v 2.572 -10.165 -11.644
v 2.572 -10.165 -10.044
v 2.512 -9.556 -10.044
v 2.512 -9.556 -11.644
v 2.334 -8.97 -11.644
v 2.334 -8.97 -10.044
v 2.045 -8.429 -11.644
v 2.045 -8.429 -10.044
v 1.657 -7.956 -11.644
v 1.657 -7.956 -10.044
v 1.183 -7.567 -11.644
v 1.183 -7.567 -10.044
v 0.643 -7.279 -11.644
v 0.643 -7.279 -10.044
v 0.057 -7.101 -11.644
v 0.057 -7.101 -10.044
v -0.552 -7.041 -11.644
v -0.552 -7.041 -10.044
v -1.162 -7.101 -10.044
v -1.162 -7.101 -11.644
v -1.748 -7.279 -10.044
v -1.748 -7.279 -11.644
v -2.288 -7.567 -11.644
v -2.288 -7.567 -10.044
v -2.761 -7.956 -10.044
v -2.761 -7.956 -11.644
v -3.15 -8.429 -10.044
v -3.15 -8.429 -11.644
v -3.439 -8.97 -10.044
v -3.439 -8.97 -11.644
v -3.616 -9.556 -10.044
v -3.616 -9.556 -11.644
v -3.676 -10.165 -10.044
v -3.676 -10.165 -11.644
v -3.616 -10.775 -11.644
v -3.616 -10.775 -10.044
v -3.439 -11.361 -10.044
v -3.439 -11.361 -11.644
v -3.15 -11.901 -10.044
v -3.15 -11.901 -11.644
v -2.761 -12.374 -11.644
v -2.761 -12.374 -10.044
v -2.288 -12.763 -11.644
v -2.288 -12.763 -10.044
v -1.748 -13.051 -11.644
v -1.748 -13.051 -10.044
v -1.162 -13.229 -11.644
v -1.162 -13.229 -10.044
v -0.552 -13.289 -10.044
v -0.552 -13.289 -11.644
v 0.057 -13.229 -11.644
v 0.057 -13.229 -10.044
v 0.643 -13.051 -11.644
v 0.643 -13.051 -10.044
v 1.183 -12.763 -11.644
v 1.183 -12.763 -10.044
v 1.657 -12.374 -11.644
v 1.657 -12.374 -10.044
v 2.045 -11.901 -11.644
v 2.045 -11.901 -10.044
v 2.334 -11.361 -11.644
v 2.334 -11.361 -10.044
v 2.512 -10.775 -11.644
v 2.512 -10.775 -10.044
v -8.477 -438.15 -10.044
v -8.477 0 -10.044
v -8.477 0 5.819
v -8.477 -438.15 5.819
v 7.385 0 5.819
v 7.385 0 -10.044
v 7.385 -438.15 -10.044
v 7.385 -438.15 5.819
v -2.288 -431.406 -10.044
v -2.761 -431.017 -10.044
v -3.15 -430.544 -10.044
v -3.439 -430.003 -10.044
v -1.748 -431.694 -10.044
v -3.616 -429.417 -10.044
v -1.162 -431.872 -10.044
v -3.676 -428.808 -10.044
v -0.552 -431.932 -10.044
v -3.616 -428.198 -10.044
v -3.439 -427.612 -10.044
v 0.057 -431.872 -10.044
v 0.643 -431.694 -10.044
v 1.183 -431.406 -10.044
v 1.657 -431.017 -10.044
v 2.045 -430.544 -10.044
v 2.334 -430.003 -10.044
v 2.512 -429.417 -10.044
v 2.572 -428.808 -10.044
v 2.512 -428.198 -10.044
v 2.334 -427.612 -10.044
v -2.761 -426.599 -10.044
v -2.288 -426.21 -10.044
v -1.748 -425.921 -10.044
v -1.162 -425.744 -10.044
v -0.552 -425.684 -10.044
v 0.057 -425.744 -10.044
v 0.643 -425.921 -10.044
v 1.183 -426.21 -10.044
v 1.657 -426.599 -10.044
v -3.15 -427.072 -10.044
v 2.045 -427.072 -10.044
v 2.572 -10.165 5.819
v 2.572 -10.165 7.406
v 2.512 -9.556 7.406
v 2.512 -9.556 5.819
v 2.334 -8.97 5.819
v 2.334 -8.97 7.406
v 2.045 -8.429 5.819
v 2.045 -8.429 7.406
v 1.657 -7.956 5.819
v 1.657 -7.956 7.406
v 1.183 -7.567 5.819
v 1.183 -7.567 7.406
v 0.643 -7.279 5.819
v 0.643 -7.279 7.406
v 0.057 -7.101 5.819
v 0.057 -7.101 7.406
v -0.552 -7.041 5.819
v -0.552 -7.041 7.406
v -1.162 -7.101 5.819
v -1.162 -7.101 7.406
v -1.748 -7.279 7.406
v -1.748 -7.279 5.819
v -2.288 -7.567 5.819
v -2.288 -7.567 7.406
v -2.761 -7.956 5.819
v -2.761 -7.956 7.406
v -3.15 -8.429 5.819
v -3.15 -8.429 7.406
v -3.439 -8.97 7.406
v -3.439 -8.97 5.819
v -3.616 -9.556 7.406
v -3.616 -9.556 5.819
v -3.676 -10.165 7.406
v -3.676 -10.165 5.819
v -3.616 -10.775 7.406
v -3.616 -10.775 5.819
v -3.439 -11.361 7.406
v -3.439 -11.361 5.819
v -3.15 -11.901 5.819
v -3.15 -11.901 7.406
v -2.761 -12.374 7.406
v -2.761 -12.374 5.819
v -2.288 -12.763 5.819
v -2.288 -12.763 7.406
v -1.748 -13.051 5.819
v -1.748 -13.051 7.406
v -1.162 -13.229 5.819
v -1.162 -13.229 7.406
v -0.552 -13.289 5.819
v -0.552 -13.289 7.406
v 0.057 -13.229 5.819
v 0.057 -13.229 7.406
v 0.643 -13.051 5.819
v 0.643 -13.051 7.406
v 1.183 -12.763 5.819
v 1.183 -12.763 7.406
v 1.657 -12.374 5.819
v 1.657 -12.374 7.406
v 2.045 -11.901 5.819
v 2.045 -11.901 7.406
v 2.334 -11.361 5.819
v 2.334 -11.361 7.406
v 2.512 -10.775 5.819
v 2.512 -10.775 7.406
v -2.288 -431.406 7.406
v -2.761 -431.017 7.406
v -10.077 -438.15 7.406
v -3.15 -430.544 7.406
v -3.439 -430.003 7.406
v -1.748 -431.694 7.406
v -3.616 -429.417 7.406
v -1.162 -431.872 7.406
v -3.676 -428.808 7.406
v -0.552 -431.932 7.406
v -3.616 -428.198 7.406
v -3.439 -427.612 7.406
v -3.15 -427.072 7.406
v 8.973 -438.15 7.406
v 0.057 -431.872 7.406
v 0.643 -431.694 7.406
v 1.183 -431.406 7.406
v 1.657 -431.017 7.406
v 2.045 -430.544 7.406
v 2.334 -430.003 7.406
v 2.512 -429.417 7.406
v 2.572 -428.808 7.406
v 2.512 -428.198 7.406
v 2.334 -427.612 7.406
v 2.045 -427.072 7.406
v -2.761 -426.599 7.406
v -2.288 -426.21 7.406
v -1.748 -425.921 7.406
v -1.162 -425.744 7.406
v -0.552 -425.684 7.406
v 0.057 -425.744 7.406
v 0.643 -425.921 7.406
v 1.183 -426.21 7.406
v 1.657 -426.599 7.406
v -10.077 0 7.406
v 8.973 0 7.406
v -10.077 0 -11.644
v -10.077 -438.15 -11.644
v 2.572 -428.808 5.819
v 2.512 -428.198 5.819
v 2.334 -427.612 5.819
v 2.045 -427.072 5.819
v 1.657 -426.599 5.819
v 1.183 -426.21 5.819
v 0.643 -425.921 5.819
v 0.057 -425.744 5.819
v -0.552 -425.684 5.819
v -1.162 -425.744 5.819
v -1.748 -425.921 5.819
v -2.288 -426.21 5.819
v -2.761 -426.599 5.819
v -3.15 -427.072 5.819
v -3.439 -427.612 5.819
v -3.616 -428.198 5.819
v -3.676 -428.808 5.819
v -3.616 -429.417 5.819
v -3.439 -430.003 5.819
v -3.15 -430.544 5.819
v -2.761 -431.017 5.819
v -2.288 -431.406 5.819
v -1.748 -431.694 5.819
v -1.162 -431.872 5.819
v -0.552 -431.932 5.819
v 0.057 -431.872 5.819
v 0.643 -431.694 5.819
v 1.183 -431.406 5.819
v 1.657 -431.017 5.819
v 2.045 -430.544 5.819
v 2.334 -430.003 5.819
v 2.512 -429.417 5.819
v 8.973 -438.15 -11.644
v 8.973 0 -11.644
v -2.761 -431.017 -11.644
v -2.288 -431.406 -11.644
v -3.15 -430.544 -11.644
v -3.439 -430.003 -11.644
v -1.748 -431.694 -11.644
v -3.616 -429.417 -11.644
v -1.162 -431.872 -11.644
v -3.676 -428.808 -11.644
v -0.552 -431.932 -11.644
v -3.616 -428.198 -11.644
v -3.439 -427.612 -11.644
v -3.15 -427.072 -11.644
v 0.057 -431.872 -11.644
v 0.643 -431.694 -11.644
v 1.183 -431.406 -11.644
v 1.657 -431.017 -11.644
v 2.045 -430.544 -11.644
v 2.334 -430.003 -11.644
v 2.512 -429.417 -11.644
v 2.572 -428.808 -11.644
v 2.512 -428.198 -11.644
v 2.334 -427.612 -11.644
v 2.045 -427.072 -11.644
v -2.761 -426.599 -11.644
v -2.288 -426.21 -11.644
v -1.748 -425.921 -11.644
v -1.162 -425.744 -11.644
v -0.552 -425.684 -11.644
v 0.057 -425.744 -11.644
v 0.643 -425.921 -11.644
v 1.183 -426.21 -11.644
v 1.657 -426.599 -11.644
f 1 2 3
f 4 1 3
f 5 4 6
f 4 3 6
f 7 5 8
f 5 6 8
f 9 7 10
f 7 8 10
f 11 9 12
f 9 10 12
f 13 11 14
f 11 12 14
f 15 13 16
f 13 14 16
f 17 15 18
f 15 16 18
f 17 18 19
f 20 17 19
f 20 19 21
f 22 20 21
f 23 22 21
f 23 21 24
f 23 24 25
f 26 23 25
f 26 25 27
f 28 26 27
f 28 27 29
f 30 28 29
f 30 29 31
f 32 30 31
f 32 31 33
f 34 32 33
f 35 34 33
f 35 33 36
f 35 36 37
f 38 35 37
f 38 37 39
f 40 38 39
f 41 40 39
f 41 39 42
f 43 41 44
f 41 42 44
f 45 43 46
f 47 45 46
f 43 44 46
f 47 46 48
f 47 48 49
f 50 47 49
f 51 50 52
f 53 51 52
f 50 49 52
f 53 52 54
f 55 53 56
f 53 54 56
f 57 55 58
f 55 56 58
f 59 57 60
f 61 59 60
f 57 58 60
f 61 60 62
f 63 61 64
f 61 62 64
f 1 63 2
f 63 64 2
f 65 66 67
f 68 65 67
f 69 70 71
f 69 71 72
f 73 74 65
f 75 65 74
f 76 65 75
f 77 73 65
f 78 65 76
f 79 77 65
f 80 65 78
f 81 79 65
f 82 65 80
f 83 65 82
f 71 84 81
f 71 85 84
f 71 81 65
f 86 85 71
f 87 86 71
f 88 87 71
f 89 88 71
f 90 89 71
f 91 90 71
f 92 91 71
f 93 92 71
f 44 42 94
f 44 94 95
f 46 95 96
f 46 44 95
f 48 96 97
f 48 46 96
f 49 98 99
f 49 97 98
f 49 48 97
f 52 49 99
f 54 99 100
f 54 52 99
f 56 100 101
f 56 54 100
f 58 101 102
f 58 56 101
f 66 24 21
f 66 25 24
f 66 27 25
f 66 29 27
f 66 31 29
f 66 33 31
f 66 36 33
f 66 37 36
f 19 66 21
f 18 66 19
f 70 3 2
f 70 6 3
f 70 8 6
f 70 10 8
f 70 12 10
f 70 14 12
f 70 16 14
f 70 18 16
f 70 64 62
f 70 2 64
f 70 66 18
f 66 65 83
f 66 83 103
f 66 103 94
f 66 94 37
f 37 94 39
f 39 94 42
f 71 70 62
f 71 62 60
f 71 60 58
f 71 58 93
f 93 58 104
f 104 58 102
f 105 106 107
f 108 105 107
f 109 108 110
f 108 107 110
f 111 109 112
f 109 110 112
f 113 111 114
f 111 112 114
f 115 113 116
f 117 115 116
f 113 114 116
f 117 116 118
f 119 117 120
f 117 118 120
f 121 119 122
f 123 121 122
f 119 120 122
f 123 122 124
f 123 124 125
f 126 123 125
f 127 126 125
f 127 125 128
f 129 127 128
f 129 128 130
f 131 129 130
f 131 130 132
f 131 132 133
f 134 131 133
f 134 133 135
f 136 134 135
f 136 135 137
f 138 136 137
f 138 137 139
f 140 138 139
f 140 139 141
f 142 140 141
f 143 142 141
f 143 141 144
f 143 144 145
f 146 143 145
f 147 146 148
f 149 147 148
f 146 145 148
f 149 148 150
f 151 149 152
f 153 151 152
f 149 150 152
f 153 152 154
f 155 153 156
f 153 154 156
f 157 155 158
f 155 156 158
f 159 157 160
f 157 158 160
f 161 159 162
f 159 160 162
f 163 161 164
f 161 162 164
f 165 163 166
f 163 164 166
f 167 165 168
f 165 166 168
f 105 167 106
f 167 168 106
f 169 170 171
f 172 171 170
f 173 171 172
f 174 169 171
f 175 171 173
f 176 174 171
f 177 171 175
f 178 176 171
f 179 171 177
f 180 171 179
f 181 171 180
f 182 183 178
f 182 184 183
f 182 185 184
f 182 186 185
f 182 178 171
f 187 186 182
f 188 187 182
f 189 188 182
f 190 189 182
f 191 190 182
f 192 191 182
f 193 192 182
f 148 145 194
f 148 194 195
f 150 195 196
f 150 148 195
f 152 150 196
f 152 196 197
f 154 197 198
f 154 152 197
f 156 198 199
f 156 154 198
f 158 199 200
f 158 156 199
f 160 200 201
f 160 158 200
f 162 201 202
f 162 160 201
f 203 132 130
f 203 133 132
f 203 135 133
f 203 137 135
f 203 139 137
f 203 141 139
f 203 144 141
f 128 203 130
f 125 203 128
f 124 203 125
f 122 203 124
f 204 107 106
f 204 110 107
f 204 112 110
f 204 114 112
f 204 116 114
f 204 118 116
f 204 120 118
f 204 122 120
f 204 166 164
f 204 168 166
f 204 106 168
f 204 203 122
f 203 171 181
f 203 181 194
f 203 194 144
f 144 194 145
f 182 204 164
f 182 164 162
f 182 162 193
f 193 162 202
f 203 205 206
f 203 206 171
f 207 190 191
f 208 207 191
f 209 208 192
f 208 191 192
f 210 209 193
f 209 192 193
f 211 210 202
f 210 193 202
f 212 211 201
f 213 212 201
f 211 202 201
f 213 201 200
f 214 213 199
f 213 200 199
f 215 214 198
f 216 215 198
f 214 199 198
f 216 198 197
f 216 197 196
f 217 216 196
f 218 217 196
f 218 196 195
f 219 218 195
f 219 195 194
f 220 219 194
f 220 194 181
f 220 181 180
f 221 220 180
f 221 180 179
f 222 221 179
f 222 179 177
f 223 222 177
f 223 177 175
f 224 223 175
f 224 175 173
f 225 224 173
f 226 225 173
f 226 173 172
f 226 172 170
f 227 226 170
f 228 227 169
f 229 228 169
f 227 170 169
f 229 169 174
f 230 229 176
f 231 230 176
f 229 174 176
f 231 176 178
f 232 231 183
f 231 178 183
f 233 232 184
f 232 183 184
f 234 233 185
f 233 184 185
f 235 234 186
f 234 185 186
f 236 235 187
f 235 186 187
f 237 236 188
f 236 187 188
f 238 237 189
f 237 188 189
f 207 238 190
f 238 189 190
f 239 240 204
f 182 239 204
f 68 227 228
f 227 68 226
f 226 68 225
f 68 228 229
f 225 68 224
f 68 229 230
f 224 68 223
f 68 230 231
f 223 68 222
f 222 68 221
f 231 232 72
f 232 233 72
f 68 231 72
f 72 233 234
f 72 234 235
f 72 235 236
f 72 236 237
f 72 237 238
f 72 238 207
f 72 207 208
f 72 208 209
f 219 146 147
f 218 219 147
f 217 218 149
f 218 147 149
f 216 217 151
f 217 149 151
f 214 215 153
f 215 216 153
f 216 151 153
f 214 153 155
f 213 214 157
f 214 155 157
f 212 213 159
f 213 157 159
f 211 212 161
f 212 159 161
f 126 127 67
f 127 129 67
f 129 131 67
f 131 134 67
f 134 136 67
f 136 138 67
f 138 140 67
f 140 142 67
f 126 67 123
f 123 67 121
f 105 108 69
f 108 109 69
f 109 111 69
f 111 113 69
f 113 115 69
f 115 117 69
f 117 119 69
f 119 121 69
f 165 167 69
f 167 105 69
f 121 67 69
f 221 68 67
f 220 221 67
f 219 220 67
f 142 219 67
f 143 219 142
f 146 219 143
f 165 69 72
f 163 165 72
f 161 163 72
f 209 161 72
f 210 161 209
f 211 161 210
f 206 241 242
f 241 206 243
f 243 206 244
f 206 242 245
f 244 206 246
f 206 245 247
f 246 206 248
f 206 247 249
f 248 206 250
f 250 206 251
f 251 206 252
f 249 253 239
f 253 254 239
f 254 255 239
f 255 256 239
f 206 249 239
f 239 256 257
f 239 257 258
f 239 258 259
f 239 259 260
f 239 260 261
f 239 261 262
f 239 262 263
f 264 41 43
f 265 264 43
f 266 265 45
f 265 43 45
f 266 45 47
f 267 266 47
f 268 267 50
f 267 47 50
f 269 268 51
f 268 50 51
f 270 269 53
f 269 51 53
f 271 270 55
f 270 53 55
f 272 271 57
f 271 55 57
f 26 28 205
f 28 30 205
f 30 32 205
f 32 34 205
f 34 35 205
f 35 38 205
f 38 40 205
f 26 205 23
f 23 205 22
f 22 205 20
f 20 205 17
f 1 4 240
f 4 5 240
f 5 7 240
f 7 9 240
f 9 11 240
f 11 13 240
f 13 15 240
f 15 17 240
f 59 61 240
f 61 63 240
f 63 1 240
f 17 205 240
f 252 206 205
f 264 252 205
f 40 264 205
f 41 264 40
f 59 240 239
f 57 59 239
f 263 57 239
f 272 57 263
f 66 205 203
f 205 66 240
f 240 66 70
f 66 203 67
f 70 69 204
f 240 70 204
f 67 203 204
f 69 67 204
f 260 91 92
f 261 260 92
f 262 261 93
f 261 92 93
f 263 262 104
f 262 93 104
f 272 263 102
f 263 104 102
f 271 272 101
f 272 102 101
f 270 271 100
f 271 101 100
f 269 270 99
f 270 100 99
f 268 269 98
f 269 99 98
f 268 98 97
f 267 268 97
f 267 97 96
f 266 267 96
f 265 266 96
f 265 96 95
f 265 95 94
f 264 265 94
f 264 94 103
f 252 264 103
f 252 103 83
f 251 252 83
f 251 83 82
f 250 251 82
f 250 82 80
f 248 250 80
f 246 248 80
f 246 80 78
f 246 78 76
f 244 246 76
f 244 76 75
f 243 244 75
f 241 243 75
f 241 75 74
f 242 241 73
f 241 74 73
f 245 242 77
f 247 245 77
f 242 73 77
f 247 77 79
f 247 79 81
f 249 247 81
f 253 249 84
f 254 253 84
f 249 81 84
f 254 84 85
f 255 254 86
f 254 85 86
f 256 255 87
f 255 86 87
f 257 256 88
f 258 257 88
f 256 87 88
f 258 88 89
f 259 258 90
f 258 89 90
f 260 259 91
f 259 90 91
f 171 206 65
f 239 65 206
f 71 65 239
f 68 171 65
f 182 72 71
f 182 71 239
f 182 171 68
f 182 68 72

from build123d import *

# Parameters (mm, degrees)
F0_W     = 19.05
F0_H     = 19.05
F0_W_2   = 15.8623
F0_H_2   = 15.8623
F1_DEPTH = 438.15
F2_R     = 3.1242
F3_DEPTH = 19.051


with BuildPart() as f1:
    # F0 (on Front) → F1 (new body)
    with BuildSketch(Plane.XZ):
        with Locations((-0.55224, -2.118741)):
            Rectangle(F0_W, F0_H)
        with Locations((-0.54589, -2.112391)):
            Rectangle(F0_W_2, F0_H_2, mode=Mode.SUBTRACT)
    extrude(amount=F1_DEPTH)

    # F2 (on face) → F3 (cut, through all)
    with BuildSketch(Plane.XY.offset(7.406259)):
        with Locations((-0.55224, -10.16508)):
            Circle(F2_R)
        with Locations((-0.55224, -428.80788)):
            Circle(F2_R)
    extrude(amount=-F3_DEPTH, mode=Mode.SUBTRACT)


solid = f1.part
